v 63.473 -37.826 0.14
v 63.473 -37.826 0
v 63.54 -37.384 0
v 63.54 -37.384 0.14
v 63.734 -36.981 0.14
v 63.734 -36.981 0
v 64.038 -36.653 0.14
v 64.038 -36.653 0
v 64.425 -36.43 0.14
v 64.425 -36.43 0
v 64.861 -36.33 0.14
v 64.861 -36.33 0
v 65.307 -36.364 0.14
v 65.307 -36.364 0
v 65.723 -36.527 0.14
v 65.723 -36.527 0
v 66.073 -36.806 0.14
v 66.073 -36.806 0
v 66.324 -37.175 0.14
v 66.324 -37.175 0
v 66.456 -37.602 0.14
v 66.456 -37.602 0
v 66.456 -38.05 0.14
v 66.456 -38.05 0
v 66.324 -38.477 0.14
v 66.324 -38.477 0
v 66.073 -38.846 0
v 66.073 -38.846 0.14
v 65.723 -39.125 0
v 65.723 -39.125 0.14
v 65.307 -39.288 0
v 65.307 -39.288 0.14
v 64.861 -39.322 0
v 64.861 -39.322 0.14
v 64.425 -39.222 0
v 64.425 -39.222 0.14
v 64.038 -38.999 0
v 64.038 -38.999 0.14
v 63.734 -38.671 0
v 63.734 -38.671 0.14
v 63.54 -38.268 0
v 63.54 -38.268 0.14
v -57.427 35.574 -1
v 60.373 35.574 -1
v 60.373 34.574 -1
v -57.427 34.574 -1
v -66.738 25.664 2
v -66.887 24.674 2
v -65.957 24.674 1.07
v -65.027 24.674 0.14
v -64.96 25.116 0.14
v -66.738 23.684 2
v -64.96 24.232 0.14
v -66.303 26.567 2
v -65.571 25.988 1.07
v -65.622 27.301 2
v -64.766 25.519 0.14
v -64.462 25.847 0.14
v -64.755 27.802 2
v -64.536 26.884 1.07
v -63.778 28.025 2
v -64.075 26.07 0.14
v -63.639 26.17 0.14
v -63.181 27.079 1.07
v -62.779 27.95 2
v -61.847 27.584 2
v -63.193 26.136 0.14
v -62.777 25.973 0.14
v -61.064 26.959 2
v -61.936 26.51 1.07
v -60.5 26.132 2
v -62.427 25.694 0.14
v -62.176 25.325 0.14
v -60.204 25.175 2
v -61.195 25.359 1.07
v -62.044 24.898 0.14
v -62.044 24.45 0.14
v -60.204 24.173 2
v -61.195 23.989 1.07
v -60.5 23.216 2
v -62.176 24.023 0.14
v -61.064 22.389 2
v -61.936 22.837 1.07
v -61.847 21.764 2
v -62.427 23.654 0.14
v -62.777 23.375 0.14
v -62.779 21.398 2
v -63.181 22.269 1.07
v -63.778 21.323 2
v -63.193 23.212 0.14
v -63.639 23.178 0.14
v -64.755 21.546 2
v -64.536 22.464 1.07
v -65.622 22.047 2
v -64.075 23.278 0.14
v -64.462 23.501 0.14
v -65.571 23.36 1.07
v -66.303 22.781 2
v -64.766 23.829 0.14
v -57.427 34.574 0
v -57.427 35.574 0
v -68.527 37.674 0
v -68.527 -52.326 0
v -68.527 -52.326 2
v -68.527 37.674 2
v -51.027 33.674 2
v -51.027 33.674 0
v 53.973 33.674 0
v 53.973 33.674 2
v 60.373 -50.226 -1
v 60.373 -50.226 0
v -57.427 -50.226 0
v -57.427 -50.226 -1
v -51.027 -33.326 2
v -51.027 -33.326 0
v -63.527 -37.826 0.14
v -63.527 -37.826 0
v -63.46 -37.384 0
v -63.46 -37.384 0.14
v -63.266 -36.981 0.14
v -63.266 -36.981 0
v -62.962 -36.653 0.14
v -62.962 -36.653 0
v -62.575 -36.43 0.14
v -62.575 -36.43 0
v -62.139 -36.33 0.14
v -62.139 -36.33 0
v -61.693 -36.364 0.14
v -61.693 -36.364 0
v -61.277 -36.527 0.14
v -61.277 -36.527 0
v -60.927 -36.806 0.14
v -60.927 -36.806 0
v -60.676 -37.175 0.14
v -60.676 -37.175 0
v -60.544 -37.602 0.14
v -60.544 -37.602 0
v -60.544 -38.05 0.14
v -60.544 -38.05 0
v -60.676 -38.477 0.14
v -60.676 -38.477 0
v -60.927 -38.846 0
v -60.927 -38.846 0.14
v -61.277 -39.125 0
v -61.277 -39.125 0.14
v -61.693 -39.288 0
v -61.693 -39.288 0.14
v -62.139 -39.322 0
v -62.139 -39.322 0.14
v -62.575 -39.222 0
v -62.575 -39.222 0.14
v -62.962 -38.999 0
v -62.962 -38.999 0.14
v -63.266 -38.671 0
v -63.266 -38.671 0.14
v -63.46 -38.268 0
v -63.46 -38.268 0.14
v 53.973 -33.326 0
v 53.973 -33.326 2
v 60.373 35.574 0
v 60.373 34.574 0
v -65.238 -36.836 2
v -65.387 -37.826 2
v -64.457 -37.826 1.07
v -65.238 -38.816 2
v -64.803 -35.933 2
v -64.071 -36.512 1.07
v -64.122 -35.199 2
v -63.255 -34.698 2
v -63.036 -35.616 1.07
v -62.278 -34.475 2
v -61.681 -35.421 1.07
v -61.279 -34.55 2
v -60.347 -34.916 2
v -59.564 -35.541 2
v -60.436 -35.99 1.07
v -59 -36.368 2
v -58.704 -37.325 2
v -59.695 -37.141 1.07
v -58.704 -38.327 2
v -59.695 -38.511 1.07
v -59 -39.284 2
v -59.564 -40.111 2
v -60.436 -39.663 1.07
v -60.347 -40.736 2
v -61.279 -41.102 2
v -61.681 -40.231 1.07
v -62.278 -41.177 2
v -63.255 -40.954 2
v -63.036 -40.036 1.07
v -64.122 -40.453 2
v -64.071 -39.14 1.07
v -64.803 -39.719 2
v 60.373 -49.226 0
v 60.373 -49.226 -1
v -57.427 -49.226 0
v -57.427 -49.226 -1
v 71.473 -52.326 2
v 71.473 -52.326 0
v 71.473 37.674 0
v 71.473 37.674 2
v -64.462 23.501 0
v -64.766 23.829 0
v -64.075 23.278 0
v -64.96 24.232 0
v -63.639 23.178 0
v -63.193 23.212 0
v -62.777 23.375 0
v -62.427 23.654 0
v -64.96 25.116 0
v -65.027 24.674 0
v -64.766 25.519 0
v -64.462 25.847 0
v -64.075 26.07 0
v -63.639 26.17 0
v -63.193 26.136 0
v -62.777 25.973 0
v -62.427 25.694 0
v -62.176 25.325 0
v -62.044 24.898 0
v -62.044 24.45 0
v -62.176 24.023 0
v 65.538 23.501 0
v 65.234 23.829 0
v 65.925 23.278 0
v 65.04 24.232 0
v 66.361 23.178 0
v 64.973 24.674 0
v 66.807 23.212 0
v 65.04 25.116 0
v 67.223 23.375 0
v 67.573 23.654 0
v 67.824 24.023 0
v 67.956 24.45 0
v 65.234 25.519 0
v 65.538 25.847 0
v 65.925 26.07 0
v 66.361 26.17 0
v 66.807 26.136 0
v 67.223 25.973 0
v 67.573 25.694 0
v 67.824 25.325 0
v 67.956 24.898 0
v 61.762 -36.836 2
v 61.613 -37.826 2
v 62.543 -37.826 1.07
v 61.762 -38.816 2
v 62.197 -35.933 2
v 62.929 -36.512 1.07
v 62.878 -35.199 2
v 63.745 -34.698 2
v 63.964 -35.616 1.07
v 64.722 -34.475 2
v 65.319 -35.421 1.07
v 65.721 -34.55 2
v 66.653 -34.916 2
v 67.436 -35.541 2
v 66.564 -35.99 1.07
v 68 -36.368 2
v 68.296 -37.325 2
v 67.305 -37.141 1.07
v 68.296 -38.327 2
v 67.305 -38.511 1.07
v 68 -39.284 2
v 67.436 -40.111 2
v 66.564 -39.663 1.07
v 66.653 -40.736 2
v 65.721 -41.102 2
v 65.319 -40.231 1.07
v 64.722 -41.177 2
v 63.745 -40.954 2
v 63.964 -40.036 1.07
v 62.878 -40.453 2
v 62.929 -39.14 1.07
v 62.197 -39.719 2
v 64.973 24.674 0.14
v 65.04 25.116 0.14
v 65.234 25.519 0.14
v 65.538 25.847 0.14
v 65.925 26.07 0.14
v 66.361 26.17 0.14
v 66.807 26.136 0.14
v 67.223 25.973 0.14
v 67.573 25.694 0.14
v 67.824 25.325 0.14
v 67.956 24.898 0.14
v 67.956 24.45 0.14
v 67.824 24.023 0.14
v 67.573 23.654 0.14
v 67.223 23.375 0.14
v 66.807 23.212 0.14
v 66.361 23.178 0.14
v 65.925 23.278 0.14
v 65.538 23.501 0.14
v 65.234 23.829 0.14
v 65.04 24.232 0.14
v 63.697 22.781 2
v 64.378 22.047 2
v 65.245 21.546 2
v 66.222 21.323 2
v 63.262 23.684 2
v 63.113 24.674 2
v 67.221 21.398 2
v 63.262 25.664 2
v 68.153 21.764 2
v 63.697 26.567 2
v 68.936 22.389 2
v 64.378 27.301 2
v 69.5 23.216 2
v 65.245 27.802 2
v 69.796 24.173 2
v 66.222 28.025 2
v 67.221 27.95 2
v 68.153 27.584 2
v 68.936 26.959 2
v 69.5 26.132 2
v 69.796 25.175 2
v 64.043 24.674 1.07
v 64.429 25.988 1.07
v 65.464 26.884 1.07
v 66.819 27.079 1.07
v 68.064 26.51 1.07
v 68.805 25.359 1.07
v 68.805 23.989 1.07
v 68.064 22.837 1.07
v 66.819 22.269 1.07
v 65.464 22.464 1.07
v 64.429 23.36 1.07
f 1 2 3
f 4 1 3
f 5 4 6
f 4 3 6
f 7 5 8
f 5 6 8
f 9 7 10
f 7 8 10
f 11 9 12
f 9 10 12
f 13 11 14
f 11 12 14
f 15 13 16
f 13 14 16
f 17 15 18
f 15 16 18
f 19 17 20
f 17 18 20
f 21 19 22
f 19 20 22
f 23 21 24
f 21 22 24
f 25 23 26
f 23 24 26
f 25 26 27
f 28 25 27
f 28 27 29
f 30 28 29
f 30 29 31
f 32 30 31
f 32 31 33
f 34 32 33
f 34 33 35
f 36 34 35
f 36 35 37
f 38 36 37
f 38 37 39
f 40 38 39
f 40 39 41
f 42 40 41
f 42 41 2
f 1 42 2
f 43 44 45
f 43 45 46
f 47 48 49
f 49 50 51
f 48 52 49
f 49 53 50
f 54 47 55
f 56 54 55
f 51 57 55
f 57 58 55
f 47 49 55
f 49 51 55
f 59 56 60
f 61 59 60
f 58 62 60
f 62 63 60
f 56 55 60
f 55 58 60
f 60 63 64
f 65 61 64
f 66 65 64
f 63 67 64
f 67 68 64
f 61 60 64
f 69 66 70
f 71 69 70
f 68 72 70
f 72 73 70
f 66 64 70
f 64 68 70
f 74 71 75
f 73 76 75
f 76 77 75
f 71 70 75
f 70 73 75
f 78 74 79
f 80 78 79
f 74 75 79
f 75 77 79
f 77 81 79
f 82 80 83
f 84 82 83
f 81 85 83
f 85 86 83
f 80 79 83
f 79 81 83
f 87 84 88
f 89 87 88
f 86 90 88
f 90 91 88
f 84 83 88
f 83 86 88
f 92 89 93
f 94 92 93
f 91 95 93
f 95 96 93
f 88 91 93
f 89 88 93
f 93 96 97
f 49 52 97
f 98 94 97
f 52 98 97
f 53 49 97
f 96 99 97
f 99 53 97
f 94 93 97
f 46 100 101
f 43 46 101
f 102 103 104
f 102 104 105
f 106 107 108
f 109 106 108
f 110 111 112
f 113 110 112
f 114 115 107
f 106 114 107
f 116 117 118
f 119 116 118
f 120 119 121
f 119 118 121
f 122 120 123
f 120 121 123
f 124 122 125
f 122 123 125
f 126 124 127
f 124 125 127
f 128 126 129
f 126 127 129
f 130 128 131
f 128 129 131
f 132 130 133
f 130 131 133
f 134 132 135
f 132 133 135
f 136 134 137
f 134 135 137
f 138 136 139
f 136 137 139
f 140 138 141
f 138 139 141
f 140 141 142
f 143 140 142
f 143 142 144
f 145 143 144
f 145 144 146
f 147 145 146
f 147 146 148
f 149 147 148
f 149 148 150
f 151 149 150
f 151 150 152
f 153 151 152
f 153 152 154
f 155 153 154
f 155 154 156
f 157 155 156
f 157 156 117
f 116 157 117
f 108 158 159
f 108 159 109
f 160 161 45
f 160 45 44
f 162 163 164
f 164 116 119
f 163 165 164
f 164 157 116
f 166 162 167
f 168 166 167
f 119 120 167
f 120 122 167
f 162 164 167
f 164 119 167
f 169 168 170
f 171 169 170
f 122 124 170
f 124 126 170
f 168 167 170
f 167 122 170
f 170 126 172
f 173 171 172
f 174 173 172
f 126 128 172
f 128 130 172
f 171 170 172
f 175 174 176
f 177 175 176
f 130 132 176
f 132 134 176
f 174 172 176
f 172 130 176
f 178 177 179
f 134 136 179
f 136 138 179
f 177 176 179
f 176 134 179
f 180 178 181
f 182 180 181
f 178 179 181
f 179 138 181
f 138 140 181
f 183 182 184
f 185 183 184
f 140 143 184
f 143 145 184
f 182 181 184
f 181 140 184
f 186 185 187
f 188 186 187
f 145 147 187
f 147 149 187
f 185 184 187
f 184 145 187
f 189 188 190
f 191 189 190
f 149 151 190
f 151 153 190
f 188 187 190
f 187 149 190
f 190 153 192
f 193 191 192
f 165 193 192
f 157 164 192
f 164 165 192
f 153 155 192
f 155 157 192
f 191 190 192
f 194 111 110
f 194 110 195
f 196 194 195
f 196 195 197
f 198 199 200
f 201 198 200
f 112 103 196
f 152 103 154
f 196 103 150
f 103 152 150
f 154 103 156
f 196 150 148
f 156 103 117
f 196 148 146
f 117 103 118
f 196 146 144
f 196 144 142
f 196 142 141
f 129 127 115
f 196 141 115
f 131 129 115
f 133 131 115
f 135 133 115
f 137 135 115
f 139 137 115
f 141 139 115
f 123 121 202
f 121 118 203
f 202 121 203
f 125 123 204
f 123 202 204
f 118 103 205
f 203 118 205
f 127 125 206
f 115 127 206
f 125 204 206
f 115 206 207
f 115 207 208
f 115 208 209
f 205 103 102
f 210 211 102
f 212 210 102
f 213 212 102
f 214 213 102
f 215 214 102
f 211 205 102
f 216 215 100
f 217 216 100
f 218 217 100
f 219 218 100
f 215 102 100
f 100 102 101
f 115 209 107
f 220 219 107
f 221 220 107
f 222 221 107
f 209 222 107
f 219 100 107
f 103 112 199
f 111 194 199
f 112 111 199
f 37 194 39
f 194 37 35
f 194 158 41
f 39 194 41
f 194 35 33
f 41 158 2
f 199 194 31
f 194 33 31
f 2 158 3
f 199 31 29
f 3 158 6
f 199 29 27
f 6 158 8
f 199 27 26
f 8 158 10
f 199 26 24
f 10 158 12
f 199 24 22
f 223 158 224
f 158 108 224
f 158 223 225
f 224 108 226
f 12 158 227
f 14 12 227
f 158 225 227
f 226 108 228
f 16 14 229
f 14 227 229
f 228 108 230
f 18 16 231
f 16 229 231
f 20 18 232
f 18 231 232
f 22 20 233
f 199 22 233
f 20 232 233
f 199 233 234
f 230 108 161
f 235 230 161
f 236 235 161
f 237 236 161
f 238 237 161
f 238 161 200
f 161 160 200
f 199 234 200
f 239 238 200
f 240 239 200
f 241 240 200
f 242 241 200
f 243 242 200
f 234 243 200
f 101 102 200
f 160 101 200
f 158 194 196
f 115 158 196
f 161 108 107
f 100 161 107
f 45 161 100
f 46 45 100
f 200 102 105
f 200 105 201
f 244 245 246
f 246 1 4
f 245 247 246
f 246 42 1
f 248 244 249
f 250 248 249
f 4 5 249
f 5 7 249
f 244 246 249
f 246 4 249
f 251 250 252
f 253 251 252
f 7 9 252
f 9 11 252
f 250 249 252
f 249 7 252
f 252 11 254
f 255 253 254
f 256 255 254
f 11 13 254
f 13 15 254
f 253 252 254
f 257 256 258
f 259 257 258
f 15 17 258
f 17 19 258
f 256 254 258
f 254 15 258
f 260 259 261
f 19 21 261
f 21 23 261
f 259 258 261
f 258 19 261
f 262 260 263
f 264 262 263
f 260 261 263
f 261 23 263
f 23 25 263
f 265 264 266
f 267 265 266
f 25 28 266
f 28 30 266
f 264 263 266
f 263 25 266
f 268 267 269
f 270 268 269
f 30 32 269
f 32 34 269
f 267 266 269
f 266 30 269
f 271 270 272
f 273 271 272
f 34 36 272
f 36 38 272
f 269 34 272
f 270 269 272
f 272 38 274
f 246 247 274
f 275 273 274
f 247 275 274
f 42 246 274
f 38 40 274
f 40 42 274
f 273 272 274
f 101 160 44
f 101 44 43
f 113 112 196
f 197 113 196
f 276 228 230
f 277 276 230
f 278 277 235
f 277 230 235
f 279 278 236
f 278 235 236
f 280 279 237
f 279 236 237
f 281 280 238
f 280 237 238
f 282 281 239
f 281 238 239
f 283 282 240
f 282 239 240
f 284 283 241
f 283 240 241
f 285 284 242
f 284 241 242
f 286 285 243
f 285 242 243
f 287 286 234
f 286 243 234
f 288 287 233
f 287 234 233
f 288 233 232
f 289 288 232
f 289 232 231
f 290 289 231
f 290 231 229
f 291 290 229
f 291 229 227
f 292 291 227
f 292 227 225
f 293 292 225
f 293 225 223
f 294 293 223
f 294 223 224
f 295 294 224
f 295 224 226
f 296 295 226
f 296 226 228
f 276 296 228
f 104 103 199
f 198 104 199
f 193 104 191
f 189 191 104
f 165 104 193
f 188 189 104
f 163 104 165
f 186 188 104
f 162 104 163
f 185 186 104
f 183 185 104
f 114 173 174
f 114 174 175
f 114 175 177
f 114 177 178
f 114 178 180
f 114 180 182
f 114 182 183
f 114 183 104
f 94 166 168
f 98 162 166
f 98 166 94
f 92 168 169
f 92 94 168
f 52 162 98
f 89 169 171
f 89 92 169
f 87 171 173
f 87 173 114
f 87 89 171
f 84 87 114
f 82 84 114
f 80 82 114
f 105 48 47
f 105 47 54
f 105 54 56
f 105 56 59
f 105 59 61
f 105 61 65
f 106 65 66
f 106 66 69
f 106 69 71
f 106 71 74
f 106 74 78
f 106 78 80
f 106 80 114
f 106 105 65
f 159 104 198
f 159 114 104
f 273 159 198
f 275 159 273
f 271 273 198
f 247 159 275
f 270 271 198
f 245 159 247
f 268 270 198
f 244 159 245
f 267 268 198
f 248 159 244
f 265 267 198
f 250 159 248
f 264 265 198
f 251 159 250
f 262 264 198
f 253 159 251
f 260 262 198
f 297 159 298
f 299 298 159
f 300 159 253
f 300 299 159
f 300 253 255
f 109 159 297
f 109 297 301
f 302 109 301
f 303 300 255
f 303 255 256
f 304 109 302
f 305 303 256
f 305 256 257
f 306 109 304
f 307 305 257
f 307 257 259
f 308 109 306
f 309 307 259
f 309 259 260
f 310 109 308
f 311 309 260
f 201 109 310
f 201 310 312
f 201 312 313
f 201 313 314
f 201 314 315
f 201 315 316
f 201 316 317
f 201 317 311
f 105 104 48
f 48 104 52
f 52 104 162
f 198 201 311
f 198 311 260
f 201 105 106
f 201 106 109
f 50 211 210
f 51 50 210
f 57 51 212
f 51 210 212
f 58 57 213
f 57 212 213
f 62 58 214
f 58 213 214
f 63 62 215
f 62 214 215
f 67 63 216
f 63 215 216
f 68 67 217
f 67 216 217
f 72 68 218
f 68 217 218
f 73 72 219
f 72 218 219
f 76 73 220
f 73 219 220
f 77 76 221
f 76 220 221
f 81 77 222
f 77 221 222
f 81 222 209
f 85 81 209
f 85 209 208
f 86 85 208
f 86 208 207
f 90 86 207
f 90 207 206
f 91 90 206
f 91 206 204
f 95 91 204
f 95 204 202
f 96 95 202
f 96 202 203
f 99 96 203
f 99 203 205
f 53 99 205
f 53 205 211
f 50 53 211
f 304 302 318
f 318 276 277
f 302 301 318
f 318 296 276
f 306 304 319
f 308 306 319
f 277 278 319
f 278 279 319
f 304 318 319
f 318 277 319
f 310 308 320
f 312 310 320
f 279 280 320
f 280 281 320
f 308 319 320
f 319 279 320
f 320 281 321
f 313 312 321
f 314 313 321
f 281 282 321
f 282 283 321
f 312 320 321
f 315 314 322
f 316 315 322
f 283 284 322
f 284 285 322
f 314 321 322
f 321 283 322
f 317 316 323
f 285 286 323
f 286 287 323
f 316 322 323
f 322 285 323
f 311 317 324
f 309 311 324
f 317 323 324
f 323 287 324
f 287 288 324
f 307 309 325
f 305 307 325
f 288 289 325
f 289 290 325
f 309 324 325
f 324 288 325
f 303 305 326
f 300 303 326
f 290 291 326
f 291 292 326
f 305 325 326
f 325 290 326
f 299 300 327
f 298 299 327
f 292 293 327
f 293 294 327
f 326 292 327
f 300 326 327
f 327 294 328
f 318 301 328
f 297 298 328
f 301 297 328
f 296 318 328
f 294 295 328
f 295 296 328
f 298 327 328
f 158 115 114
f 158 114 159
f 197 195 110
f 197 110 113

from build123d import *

# Parameters (mm, degrees)
SKETCH1_W           = 140
SKETCH1_H           = 90
SKETCH1_W_2         = 105
SKETCH1_H_2         = 67
BOSS_EXTRUDE1_DEPTH = 2
SKETCH2_R           = 1.5
CUT_EXTRUDE1_DEPTH  = 89.602535605
CHAMFER1_SIZE       = 1.86
SKETCH8_W           = 117.8
SKETCH8_H           = 1
BOSS_EXTRUDE3_DEPTH = 1


with BuildPart() as part:
    # Sketch1 → Boss-Extrude1 (new body)
    with BuildSketch(Plane.XY):
        with Locations((1.473041333, -7.32603251)):
            Rectangle(SKETCH1_W, SKETCH1_H)
        with Locations((1.473041333, 0.17396749)):
            Rectangle(SKETCH1_W_2, SKETCH1_H_2, mode=Mode.SUBTRACT)
    extrude(amount=BOSS_EXTRUDE1_DEPTH)

    # Sketch2 → Cut-Extrude1 (cut, through all)
    with BuildSketch(Plane(origin=(0, 0, 0), x_dir=(-1, 0, 0), z_dir=(0, 0, -1))):
        with Locations((62.026958667, -37.82603251)):
            Circle(SKETCH2_R)
        with Locations((63.526958667, 24.67396749)):
            Circle(SKETCH2_R)
        with Locations((-64.973041333, -37.82603251)):
            Circle(SKETCH2_R)
        with Locations((-66.473041333, 24.67396749)):
            Circle(SKETCH2_R)
    extrude(amount=-CUT_EXTRUDE1_DEPTH, mode=Mode.SUBTRACT)

    # Chamfer1
    chamfer1_edges = [part.edges().sort_by_distance(p)[0] for p in [
        (-60.526958667, -37.82603251, 2),
        (-62.026958667, 24.67396749, 2),
        (66.473041333, -37.82603251, 2),
        (67.973041333, 24.67396749, 2),
    ]]
    chamfer(chamfer1_edges, length=CHAMFER1_SIZE)

    # Sketch8 → Boss-Extrude3 (add)
    with BuildSketch(Plane(origin=(0, 0, 0), x_dir=(-1, 0, 0), z_dir=(0, 0, -1))):
        with Locations((-1.473041333, -49.72603251)):
            Rectangle(SKETCH8_W, SKETCH8_H)
        with Locations((-1.473041333, 35.07396749)):
            Rectangle(SKETCH8_W, SKETCH8_H)
    extrude(amount=BOSS_EXTRUDE3_DEPTH)


solid = part.part
